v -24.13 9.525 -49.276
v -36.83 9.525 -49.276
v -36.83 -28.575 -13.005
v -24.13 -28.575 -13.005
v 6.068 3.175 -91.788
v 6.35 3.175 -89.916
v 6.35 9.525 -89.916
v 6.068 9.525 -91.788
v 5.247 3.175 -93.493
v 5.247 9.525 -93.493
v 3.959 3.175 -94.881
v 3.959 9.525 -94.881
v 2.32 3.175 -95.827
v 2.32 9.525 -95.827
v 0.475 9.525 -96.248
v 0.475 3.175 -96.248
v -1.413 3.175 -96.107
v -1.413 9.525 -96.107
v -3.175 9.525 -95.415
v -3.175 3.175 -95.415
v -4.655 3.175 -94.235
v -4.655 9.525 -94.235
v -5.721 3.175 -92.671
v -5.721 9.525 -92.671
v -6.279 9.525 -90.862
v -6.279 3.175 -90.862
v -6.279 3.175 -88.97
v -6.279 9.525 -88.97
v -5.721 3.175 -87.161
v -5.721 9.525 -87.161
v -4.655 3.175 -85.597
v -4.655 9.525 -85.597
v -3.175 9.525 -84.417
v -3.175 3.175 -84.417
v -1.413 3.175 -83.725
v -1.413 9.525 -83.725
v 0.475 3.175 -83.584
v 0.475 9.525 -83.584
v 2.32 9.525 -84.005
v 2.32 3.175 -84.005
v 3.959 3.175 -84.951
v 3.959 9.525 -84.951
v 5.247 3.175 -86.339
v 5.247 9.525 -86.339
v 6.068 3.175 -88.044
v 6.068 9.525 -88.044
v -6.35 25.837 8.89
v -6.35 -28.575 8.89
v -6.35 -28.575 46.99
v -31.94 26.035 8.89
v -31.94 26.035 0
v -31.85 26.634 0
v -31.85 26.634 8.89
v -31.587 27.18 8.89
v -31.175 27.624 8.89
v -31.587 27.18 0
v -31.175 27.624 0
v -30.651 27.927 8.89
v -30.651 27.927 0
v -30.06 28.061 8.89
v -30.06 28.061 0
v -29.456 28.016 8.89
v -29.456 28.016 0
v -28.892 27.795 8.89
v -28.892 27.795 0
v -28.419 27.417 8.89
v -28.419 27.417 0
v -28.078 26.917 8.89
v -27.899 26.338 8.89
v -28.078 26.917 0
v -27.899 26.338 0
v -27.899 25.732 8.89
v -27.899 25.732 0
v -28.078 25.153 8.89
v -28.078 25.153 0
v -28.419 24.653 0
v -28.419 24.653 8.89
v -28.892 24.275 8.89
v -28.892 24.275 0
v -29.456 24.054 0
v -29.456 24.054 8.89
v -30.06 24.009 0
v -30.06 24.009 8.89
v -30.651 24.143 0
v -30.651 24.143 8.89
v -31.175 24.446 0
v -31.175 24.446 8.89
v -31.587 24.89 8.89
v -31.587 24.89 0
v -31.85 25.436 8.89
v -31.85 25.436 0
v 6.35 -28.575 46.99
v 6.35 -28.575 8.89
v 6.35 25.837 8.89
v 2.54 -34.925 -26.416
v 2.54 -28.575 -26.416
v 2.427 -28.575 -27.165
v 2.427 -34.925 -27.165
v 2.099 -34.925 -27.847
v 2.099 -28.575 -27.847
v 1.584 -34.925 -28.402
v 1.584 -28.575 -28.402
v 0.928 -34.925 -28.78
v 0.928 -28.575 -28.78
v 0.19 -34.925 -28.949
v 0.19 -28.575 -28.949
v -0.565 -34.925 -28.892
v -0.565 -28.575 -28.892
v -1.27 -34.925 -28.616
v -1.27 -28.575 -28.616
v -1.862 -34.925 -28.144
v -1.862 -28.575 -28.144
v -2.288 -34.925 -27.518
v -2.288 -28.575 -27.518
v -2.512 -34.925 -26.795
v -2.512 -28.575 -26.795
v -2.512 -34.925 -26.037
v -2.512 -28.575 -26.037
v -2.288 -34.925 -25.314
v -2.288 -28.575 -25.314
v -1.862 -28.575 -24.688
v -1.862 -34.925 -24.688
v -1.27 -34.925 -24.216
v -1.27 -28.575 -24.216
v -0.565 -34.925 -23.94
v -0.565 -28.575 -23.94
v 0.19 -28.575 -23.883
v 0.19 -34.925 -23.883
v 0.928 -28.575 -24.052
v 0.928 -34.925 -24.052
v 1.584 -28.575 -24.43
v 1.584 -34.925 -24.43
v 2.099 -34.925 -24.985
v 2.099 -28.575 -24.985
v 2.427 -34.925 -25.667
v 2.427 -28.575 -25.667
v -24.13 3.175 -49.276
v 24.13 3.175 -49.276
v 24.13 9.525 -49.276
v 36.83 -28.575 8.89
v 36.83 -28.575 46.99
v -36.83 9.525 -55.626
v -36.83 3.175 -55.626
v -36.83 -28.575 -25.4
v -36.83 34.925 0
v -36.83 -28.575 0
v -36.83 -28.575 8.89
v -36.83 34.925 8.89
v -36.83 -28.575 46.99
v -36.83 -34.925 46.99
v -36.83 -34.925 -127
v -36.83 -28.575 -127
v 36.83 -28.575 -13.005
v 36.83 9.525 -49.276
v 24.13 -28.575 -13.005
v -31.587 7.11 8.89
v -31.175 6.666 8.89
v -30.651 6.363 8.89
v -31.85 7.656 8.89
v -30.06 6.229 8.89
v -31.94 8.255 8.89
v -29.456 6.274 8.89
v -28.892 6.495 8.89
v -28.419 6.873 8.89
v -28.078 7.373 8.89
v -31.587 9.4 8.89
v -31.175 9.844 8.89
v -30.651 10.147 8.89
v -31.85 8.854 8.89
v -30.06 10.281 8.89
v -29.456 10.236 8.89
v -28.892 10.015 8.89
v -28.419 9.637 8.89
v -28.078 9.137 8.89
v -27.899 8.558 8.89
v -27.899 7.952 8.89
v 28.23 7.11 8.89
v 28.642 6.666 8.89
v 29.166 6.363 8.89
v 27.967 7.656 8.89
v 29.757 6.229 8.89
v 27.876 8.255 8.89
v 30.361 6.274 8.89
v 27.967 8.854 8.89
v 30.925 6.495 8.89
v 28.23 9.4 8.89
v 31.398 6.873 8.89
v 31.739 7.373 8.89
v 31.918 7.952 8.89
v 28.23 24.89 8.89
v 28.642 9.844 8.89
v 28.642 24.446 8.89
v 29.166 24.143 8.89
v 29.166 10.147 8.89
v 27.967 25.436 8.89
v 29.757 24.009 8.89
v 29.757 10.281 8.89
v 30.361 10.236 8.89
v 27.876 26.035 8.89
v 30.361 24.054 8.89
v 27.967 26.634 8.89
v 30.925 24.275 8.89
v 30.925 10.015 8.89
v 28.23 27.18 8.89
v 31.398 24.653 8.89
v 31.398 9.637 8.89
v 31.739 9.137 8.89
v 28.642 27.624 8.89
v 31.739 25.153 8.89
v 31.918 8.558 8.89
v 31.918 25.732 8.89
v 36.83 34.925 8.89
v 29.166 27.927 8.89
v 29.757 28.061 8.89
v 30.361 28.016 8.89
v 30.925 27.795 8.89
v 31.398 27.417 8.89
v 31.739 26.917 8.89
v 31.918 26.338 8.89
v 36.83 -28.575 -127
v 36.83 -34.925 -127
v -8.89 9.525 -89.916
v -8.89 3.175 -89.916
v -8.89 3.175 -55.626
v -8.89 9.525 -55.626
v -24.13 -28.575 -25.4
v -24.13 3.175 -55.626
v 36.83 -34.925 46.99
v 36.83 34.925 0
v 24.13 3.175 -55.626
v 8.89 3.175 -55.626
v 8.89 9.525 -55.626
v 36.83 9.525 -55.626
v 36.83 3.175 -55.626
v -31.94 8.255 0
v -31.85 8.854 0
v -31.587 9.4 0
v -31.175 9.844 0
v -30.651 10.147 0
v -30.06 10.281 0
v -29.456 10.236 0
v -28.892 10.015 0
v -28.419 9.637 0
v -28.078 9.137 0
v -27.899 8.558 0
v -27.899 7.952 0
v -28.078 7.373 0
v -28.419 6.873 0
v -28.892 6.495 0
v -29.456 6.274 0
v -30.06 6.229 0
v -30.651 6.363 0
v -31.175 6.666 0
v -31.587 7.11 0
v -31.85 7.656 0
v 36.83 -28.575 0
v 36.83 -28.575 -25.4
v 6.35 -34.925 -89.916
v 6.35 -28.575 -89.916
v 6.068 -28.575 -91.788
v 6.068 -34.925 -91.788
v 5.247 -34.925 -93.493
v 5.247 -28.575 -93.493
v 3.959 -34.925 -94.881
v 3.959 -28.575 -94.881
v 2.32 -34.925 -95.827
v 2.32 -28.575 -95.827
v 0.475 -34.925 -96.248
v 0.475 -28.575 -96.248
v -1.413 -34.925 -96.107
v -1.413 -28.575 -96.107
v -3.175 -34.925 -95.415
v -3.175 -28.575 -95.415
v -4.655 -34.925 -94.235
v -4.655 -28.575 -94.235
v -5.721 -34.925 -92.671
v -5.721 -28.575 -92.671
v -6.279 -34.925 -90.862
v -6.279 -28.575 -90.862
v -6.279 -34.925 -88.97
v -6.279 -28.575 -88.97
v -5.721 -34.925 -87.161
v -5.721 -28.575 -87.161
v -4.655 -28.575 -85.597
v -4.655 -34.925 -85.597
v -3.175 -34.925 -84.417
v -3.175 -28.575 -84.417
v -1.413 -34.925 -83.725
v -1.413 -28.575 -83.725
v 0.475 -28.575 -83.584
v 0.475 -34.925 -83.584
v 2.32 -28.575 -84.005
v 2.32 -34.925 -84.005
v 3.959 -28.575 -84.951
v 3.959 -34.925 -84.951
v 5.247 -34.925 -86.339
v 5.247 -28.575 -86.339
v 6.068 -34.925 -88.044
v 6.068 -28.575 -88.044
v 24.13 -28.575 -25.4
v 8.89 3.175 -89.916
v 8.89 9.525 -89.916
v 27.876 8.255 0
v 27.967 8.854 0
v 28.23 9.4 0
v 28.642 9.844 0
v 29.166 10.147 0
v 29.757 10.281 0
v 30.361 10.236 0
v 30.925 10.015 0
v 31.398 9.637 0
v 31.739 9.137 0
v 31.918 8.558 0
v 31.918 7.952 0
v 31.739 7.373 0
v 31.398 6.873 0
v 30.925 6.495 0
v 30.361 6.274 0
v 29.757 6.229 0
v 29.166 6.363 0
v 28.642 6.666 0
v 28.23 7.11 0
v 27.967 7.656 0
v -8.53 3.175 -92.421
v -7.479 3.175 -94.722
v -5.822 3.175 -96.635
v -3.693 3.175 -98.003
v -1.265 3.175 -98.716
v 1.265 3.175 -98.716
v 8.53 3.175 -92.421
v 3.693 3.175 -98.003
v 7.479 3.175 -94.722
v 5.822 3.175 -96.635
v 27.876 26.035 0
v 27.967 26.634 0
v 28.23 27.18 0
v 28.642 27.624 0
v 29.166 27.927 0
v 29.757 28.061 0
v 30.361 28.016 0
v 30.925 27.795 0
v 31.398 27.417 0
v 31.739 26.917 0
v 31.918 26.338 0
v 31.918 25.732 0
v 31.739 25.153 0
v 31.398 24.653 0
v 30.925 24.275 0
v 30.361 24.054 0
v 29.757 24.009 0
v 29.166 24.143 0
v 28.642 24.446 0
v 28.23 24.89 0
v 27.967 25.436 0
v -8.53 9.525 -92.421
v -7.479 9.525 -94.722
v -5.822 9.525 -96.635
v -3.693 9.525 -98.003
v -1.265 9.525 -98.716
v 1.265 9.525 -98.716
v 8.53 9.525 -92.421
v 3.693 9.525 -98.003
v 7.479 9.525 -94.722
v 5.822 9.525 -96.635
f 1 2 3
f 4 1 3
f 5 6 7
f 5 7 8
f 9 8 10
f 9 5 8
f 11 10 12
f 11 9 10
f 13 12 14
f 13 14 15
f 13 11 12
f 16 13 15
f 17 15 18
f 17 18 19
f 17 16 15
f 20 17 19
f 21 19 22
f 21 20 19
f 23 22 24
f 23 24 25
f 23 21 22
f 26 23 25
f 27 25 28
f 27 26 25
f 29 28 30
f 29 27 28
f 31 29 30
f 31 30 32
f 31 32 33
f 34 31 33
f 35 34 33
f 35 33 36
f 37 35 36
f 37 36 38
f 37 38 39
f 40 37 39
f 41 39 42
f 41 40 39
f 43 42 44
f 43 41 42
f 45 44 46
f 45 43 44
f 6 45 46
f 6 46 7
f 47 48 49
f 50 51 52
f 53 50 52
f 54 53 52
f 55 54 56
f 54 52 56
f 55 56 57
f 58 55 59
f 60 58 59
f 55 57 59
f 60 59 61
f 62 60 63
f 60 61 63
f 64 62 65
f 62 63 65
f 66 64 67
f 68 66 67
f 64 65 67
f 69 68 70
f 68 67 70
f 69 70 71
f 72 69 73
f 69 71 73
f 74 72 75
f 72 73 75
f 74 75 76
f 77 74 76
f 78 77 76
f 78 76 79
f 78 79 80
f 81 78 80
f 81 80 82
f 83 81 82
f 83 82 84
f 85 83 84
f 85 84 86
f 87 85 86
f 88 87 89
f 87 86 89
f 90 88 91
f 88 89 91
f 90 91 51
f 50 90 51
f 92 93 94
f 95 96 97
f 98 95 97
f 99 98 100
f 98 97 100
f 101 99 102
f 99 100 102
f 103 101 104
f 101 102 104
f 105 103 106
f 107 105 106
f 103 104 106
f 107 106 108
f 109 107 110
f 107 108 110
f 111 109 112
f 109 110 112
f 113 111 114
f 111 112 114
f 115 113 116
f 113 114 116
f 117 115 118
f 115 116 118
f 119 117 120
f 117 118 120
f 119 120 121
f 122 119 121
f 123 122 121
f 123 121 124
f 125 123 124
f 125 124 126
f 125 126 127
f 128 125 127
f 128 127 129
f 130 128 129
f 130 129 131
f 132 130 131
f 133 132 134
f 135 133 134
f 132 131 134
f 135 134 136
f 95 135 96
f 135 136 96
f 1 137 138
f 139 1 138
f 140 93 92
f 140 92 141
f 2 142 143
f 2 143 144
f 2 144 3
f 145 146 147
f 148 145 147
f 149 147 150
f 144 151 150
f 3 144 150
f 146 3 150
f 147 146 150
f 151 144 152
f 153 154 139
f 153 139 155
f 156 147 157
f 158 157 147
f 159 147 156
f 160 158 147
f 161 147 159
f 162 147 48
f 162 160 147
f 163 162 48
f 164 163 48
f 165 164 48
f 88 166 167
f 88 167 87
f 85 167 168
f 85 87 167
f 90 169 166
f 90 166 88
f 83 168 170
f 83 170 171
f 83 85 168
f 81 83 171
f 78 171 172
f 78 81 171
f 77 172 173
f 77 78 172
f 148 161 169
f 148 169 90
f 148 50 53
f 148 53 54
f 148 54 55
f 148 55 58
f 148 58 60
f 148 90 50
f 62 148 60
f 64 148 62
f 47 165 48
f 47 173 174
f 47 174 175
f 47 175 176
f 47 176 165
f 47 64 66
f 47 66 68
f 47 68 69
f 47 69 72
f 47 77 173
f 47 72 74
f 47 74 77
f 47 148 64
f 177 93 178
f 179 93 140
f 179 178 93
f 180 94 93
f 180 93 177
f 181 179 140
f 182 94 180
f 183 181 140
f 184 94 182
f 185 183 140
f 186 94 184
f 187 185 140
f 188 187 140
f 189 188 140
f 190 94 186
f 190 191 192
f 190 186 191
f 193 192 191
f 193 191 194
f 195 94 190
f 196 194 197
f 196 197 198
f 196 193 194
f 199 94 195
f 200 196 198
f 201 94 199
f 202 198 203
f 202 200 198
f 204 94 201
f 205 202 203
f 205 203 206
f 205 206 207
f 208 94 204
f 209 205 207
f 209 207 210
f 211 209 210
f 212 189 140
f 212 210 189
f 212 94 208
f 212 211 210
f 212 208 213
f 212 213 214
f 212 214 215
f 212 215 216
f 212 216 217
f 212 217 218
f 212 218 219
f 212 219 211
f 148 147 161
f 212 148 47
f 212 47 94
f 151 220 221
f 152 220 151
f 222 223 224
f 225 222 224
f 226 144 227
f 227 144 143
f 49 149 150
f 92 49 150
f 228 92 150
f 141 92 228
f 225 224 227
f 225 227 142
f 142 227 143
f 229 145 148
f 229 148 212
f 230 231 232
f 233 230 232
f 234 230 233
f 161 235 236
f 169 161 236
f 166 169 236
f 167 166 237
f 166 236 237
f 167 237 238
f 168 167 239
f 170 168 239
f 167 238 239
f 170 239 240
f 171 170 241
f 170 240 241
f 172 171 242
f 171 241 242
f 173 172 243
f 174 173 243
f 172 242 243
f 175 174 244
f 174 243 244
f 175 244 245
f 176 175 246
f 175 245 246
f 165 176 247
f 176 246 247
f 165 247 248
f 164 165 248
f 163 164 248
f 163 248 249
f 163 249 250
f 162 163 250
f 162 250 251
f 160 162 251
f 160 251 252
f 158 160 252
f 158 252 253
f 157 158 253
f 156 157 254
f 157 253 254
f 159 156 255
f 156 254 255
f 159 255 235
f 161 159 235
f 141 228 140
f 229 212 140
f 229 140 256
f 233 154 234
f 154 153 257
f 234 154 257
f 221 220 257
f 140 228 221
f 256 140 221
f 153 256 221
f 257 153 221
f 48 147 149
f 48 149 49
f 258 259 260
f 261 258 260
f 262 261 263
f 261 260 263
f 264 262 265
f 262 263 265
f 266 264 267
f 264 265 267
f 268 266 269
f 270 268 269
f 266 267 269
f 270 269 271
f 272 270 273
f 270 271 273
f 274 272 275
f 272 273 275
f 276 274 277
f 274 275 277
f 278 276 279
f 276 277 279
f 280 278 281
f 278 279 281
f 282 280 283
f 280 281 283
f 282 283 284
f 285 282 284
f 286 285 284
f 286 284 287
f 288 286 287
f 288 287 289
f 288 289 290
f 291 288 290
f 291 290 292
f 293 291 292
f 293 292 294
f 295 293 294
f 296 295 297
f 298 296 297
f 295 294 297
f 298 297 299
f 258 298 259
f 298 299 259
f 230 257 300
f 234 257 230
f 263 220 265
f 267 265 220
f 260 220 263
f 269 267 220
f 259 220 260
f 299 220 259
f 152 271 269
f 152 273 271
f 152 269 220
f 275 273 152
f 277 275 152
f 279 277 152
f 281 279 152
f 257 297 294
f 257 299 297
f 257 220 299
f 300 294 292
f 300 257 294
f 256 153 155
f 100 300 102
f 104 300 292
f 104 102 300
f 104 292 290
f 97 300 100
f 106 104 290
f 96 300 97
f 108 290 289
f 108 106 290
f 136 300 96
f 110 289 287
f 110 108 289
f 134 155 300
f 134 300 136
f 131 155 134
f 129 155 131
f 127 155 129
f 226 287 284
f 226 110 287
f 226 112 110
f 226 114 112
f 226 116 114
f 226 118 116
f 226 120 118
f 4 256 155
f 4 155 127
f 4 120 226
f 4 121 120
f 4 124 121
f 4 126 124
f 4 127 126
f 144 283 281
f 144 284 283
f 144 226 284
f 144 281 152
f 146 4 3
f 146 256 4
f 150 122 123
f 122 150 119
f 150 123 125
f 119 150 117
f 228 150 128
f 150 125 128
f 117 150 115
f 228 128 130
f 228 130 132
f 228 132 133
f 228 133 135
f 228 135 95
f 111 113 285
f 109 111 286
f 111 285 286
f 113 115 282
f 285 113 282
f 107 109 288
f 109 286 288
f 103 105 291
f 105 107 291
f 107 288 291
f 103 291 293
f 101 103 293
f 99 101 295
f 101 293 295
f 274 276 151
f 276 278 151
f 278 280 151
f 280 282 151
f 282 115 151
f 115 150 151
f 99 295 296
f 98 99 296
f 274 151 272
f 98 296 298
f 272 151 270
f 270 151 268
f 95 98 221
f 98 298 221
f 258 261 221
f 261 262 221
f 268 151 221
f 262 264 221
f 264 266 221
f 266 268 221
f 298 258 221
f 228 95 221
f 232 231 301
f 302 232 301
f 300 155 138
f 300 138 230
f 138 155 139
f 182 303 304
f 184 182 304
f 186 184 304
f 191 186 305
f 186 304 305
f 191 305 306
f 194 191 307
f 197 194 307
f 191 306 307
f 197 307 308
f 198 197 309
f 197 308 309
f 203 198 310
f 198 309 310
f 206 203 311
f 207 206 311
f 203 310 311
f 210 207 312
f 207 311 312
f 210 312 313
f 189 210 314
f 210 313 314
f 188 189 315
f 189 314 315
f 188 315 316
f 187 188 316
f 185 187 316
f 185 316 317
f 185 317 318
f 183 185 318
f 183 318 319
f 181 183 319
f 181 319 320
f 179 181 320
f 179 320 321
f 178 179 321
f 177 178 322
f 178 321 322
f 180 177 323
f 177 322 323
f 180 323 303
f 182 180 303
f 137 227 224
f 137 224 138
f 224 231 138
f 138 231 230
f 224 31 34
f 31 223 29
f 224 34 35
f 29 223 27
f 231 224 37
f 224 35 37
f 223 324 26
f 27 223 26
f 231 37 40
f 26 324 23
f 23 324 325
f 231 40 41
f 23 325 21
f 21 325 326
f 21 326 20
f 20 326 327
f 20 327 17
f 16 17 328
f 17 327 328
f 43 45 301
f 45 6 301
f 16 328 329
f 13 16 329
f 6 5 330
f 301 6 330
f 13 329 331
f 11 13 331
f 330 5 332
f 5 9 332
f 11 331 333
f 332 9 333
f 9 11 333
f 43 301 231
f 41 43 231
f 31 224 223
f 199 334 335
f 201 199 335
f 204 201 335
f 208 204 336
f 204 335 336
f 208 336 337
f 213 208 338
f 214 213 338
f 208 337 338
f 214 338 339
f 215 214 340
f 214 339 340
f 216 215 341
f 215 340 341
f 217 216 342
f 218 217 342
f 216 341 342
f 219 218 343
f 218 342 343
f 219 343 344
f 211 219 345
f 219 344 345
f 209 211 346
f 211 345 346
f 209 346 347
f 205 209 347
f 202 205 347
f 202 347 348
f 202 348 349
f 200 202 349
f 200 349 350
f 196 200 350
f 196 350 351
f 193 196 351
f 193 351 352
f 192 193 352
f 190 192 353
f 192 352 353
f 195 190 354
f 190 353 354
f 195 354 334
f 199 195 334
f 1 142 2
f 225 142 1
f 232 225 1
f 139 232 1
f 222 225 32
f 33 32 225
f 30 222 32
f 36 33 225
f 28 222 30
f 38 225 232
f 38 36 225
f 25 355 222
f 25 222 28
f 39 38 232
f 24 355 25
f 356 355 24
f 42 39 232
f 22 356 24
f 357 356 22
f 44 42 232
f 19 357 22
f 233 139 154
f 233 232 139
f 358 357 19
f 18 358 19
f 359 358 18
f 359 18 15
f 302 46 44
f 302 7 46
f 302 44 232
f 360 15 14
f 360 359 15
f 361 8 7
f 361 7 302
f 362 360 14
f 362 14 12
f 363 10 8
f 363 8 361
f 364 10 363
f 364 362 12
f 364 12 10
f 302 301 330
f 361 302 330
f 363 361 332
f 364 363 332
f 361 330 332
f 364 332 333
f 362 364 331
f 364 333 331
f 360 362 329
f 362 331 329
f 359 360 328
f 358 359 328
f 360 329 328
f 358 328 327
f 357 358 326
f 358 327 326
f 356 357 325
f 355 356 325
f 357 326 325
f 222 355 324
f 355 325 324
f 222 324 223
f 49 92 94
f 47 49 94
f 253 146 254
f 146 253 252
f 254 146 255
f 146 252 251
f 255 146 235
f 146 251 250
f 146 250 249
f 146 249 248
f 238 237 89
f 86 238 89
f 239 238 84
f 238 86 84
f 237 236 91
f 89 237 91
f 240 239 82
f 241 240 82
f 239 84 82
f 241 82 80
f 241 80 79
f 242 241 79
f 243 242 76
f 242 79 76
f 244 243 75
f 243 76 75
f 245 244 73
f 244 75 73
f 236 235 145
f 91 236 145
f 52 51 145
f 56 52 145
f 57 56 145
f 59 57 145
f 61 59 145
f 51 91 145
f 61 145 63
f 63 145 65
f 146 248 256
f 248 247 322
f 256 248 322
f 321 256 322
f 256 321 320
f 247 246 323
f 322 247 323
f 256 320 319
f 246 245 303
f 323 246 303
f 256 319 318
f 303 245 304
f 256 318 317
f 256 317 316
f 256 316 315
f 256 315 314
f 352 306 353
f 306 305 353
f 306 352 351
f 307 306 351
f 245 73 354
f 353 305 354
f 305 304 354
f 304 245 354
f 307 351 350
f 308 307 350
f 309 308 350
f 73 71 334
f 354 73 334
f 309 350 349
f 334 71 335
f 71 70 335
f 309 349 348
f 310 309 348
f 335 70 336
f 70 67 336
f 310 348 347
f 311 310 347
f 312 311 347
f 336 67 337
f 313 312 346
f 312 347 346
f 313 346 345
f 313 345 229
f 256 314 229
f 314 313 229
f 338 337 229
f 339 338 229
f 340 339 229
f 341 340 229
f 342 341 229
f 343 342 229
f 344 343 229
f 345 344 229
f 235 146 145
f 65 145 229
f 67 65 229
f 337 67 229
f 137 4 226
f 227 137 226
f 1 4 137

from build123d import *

# Parameters (mm, degrees)
SKETCH1_W            = 73.66
SKETCH1_H            = 69.85
BOSS_EXTRUDE1_DEPTH  = 8.89
SKETCH2_R            = 2.032
CUT_EXTRUDE1_DEPTH   = 8.89
SKETCH3_W            = 73.66
SKETCH3_H            = 6.35
BOSS_EXTRUDE2_DEPTH  = 127
SKETCH4_W            = 73.66
SKETCH4_H            = 6.35
BOSS_EXTRUDE3_DEPTH  = 38.1
BOSS_EXTRUDE4_START  = -36.83
BOSS_EXTRUDE4_DEPTH  = 6.35
SKETCH7_R            = 2.54
SKETCH7_R_2          = 6.35
CUT_EXTRUDE2_DEPTH   = 6.35
BOSS_EXTRUDE15_DEPTH = 12.7
SKETCH23_R           = 6.35
BOSS_EXTRUDE16_DEPTH = 6.35
BOSS_EXTRUDE17_DEPTH = 12.7
SKETCH25_W           = 27.94
SKETCH25_H           = 6.35
BOSS_EXTRUDE18_DEPTH = 6.35


with BuildPart() as part:
    # Sketch1 → Boss-Extrude1 (new body)
    with BuildSketch(Plane.XY):
        Rectangle(SKETCH1_W, SKETCH1_H)
    extrude(amount=BOSS_EXTRUDE1_DEPTH)

    # Sketch2 → Cut-Extrude1 (cut)
    with BuildSketch(Plane(origin=(0, 0, 0), x_dir=(-1, 0, 0), z_dir=(0, 0, -1))):
        with Locations((-29.9085, 26.035)):
            Circle(SKETCH2_R)
        with Locations((-29.9085, 8.255)):
            Circle(SKETCH2_R)
        with Locations((29.9085, 8.255)):
            Circle(SKETCH2_R)
        with Locations((29.9085, 26.035)):
            Circle(SKETCH2_R)
    extrude(amount=-CUT_EXTRUDE1_DEPTH, mode=Mode.SUBTRACT)

    # Sketch3 → Boss-Extrude2 (add)
    with BuildSketch(Plane(origin=(0, 0, 0), x_dir=(-1, 0, 0), z_dir=(0, 0, -1))):
        with Locations((0, -31.75)):
            Rectangle(SKETCH3_W, SKETCH3_H)
    extrude(amount=BOSS_EXTRUDE2_DEPTH)

    # Sketch4 → Boss-Extrude3 (add)
    with BuildSketch(Plane.XY.offset(8.89)):
        with Locations((0, -31.75)):
            Rectangle(SKETCH4_W, SKETCH4_H)
    extrude(amount=BOSS_EXTRUDE3_DEPTH)

    # Sketch5 → Boss-Extrude4 (add, symmetric)
    with BuildSketch(Plane(origin=(36.83, 0, 0), x_dir=(0, 0, -1), z_dir=(1, 0, 0)).offset(BOSS_EXTRUDE4_START)):
        Polygon((-46.99, -28.575), (-8.89, 25.837439057), (-8.89, -28.575), align=None)
    extrude(amount=BOSS_EXTRUDE4_DEPTH, both=True)

    # Sketch7 → Cut-Extrude2 (cut)
    with BuildSketch(Plane(origin=(0, -28.575, 0), x_dir=(1, 0, 0), z_dir=(0, 1, 0))):
        with Locations((0, 26.416)):
            Circle(SKETCH7_R)
        with Locations((0, 89.916)):
            Circle(SKETCH7_R_2)
    extrude(amount=-CUT_EXTRUDE2_DEPTH, mode=Mode.SUBTRACT)

    # Sketch21 → Boss-Extrude15 (add)
    with BuildSketch(Plane.ZY.offset(36.83)):
        Polygon((-25.4, -28.575), (-55.626, 3.175), (-49.276, 3.175), (-49.276, 9.525), (-13.0048, -28.575), align=None)
    extrude(amount=-BOSS_EXTRUDE15_DEPTH)

    # Sketch23 → Boss-Extrude16 (add)
    with BuildSketch(Plane(origin=(0, 3.175, 0), x_dir=(1, 0, 0), z_dir=(0, 1, 0))):
        with BuildLine():
            Line((-36.83, 49.276), (8.89, 49.276))
            Line((8.89, 49.276), (8.89, 89.916))
            ThreePointArc((8.89, 89.916), (0, 98.806), (-8.89, 89.916))
            Line((-8.89, 89.916), (-8.89, 55.626))
            Line((-8.89, 55.626), (-36.83, 55.626))
            Line((-36.83, 55.626), (-36.83, 49.276))
        make_face()
        with Locations((0, 89.916)):
            Circle(SKETCH23_R, mode=Mode.SUBTRACT)
    extrude(amount=BOSS_EXTRUDE16_DEPTH)

    # Sketch24 → Boss-Extrude17 (add)
    with BuildSketch(Plane(origin=(36.83, 0, 0), x_dir=(0, 0, -1), z_dir=(1, 0, 0))):
        Polygon((25.4, -28.575), (55.626, 3.175), (49.276, 3.175), (49.276, 9.525), (13.0048, -28.575), align=None)
    extrude(amount=-BOSS_EXTRUDE17_DEPTH)

    # Sketch25 → Boss-Extrude18 (add)
    with BuildSketch(Plane(origin=(0, 3.175, 0), x_dir=(1, 0, 0), z_dir=(0, 1, 0))):
        with Locations((22.86, 52.451)):
            Rectangle(SKETCH25_W, SKETCH25_H)
    extrude(amount=BOSS_EXTRUDE18_DEPTH)


solid = part.part
